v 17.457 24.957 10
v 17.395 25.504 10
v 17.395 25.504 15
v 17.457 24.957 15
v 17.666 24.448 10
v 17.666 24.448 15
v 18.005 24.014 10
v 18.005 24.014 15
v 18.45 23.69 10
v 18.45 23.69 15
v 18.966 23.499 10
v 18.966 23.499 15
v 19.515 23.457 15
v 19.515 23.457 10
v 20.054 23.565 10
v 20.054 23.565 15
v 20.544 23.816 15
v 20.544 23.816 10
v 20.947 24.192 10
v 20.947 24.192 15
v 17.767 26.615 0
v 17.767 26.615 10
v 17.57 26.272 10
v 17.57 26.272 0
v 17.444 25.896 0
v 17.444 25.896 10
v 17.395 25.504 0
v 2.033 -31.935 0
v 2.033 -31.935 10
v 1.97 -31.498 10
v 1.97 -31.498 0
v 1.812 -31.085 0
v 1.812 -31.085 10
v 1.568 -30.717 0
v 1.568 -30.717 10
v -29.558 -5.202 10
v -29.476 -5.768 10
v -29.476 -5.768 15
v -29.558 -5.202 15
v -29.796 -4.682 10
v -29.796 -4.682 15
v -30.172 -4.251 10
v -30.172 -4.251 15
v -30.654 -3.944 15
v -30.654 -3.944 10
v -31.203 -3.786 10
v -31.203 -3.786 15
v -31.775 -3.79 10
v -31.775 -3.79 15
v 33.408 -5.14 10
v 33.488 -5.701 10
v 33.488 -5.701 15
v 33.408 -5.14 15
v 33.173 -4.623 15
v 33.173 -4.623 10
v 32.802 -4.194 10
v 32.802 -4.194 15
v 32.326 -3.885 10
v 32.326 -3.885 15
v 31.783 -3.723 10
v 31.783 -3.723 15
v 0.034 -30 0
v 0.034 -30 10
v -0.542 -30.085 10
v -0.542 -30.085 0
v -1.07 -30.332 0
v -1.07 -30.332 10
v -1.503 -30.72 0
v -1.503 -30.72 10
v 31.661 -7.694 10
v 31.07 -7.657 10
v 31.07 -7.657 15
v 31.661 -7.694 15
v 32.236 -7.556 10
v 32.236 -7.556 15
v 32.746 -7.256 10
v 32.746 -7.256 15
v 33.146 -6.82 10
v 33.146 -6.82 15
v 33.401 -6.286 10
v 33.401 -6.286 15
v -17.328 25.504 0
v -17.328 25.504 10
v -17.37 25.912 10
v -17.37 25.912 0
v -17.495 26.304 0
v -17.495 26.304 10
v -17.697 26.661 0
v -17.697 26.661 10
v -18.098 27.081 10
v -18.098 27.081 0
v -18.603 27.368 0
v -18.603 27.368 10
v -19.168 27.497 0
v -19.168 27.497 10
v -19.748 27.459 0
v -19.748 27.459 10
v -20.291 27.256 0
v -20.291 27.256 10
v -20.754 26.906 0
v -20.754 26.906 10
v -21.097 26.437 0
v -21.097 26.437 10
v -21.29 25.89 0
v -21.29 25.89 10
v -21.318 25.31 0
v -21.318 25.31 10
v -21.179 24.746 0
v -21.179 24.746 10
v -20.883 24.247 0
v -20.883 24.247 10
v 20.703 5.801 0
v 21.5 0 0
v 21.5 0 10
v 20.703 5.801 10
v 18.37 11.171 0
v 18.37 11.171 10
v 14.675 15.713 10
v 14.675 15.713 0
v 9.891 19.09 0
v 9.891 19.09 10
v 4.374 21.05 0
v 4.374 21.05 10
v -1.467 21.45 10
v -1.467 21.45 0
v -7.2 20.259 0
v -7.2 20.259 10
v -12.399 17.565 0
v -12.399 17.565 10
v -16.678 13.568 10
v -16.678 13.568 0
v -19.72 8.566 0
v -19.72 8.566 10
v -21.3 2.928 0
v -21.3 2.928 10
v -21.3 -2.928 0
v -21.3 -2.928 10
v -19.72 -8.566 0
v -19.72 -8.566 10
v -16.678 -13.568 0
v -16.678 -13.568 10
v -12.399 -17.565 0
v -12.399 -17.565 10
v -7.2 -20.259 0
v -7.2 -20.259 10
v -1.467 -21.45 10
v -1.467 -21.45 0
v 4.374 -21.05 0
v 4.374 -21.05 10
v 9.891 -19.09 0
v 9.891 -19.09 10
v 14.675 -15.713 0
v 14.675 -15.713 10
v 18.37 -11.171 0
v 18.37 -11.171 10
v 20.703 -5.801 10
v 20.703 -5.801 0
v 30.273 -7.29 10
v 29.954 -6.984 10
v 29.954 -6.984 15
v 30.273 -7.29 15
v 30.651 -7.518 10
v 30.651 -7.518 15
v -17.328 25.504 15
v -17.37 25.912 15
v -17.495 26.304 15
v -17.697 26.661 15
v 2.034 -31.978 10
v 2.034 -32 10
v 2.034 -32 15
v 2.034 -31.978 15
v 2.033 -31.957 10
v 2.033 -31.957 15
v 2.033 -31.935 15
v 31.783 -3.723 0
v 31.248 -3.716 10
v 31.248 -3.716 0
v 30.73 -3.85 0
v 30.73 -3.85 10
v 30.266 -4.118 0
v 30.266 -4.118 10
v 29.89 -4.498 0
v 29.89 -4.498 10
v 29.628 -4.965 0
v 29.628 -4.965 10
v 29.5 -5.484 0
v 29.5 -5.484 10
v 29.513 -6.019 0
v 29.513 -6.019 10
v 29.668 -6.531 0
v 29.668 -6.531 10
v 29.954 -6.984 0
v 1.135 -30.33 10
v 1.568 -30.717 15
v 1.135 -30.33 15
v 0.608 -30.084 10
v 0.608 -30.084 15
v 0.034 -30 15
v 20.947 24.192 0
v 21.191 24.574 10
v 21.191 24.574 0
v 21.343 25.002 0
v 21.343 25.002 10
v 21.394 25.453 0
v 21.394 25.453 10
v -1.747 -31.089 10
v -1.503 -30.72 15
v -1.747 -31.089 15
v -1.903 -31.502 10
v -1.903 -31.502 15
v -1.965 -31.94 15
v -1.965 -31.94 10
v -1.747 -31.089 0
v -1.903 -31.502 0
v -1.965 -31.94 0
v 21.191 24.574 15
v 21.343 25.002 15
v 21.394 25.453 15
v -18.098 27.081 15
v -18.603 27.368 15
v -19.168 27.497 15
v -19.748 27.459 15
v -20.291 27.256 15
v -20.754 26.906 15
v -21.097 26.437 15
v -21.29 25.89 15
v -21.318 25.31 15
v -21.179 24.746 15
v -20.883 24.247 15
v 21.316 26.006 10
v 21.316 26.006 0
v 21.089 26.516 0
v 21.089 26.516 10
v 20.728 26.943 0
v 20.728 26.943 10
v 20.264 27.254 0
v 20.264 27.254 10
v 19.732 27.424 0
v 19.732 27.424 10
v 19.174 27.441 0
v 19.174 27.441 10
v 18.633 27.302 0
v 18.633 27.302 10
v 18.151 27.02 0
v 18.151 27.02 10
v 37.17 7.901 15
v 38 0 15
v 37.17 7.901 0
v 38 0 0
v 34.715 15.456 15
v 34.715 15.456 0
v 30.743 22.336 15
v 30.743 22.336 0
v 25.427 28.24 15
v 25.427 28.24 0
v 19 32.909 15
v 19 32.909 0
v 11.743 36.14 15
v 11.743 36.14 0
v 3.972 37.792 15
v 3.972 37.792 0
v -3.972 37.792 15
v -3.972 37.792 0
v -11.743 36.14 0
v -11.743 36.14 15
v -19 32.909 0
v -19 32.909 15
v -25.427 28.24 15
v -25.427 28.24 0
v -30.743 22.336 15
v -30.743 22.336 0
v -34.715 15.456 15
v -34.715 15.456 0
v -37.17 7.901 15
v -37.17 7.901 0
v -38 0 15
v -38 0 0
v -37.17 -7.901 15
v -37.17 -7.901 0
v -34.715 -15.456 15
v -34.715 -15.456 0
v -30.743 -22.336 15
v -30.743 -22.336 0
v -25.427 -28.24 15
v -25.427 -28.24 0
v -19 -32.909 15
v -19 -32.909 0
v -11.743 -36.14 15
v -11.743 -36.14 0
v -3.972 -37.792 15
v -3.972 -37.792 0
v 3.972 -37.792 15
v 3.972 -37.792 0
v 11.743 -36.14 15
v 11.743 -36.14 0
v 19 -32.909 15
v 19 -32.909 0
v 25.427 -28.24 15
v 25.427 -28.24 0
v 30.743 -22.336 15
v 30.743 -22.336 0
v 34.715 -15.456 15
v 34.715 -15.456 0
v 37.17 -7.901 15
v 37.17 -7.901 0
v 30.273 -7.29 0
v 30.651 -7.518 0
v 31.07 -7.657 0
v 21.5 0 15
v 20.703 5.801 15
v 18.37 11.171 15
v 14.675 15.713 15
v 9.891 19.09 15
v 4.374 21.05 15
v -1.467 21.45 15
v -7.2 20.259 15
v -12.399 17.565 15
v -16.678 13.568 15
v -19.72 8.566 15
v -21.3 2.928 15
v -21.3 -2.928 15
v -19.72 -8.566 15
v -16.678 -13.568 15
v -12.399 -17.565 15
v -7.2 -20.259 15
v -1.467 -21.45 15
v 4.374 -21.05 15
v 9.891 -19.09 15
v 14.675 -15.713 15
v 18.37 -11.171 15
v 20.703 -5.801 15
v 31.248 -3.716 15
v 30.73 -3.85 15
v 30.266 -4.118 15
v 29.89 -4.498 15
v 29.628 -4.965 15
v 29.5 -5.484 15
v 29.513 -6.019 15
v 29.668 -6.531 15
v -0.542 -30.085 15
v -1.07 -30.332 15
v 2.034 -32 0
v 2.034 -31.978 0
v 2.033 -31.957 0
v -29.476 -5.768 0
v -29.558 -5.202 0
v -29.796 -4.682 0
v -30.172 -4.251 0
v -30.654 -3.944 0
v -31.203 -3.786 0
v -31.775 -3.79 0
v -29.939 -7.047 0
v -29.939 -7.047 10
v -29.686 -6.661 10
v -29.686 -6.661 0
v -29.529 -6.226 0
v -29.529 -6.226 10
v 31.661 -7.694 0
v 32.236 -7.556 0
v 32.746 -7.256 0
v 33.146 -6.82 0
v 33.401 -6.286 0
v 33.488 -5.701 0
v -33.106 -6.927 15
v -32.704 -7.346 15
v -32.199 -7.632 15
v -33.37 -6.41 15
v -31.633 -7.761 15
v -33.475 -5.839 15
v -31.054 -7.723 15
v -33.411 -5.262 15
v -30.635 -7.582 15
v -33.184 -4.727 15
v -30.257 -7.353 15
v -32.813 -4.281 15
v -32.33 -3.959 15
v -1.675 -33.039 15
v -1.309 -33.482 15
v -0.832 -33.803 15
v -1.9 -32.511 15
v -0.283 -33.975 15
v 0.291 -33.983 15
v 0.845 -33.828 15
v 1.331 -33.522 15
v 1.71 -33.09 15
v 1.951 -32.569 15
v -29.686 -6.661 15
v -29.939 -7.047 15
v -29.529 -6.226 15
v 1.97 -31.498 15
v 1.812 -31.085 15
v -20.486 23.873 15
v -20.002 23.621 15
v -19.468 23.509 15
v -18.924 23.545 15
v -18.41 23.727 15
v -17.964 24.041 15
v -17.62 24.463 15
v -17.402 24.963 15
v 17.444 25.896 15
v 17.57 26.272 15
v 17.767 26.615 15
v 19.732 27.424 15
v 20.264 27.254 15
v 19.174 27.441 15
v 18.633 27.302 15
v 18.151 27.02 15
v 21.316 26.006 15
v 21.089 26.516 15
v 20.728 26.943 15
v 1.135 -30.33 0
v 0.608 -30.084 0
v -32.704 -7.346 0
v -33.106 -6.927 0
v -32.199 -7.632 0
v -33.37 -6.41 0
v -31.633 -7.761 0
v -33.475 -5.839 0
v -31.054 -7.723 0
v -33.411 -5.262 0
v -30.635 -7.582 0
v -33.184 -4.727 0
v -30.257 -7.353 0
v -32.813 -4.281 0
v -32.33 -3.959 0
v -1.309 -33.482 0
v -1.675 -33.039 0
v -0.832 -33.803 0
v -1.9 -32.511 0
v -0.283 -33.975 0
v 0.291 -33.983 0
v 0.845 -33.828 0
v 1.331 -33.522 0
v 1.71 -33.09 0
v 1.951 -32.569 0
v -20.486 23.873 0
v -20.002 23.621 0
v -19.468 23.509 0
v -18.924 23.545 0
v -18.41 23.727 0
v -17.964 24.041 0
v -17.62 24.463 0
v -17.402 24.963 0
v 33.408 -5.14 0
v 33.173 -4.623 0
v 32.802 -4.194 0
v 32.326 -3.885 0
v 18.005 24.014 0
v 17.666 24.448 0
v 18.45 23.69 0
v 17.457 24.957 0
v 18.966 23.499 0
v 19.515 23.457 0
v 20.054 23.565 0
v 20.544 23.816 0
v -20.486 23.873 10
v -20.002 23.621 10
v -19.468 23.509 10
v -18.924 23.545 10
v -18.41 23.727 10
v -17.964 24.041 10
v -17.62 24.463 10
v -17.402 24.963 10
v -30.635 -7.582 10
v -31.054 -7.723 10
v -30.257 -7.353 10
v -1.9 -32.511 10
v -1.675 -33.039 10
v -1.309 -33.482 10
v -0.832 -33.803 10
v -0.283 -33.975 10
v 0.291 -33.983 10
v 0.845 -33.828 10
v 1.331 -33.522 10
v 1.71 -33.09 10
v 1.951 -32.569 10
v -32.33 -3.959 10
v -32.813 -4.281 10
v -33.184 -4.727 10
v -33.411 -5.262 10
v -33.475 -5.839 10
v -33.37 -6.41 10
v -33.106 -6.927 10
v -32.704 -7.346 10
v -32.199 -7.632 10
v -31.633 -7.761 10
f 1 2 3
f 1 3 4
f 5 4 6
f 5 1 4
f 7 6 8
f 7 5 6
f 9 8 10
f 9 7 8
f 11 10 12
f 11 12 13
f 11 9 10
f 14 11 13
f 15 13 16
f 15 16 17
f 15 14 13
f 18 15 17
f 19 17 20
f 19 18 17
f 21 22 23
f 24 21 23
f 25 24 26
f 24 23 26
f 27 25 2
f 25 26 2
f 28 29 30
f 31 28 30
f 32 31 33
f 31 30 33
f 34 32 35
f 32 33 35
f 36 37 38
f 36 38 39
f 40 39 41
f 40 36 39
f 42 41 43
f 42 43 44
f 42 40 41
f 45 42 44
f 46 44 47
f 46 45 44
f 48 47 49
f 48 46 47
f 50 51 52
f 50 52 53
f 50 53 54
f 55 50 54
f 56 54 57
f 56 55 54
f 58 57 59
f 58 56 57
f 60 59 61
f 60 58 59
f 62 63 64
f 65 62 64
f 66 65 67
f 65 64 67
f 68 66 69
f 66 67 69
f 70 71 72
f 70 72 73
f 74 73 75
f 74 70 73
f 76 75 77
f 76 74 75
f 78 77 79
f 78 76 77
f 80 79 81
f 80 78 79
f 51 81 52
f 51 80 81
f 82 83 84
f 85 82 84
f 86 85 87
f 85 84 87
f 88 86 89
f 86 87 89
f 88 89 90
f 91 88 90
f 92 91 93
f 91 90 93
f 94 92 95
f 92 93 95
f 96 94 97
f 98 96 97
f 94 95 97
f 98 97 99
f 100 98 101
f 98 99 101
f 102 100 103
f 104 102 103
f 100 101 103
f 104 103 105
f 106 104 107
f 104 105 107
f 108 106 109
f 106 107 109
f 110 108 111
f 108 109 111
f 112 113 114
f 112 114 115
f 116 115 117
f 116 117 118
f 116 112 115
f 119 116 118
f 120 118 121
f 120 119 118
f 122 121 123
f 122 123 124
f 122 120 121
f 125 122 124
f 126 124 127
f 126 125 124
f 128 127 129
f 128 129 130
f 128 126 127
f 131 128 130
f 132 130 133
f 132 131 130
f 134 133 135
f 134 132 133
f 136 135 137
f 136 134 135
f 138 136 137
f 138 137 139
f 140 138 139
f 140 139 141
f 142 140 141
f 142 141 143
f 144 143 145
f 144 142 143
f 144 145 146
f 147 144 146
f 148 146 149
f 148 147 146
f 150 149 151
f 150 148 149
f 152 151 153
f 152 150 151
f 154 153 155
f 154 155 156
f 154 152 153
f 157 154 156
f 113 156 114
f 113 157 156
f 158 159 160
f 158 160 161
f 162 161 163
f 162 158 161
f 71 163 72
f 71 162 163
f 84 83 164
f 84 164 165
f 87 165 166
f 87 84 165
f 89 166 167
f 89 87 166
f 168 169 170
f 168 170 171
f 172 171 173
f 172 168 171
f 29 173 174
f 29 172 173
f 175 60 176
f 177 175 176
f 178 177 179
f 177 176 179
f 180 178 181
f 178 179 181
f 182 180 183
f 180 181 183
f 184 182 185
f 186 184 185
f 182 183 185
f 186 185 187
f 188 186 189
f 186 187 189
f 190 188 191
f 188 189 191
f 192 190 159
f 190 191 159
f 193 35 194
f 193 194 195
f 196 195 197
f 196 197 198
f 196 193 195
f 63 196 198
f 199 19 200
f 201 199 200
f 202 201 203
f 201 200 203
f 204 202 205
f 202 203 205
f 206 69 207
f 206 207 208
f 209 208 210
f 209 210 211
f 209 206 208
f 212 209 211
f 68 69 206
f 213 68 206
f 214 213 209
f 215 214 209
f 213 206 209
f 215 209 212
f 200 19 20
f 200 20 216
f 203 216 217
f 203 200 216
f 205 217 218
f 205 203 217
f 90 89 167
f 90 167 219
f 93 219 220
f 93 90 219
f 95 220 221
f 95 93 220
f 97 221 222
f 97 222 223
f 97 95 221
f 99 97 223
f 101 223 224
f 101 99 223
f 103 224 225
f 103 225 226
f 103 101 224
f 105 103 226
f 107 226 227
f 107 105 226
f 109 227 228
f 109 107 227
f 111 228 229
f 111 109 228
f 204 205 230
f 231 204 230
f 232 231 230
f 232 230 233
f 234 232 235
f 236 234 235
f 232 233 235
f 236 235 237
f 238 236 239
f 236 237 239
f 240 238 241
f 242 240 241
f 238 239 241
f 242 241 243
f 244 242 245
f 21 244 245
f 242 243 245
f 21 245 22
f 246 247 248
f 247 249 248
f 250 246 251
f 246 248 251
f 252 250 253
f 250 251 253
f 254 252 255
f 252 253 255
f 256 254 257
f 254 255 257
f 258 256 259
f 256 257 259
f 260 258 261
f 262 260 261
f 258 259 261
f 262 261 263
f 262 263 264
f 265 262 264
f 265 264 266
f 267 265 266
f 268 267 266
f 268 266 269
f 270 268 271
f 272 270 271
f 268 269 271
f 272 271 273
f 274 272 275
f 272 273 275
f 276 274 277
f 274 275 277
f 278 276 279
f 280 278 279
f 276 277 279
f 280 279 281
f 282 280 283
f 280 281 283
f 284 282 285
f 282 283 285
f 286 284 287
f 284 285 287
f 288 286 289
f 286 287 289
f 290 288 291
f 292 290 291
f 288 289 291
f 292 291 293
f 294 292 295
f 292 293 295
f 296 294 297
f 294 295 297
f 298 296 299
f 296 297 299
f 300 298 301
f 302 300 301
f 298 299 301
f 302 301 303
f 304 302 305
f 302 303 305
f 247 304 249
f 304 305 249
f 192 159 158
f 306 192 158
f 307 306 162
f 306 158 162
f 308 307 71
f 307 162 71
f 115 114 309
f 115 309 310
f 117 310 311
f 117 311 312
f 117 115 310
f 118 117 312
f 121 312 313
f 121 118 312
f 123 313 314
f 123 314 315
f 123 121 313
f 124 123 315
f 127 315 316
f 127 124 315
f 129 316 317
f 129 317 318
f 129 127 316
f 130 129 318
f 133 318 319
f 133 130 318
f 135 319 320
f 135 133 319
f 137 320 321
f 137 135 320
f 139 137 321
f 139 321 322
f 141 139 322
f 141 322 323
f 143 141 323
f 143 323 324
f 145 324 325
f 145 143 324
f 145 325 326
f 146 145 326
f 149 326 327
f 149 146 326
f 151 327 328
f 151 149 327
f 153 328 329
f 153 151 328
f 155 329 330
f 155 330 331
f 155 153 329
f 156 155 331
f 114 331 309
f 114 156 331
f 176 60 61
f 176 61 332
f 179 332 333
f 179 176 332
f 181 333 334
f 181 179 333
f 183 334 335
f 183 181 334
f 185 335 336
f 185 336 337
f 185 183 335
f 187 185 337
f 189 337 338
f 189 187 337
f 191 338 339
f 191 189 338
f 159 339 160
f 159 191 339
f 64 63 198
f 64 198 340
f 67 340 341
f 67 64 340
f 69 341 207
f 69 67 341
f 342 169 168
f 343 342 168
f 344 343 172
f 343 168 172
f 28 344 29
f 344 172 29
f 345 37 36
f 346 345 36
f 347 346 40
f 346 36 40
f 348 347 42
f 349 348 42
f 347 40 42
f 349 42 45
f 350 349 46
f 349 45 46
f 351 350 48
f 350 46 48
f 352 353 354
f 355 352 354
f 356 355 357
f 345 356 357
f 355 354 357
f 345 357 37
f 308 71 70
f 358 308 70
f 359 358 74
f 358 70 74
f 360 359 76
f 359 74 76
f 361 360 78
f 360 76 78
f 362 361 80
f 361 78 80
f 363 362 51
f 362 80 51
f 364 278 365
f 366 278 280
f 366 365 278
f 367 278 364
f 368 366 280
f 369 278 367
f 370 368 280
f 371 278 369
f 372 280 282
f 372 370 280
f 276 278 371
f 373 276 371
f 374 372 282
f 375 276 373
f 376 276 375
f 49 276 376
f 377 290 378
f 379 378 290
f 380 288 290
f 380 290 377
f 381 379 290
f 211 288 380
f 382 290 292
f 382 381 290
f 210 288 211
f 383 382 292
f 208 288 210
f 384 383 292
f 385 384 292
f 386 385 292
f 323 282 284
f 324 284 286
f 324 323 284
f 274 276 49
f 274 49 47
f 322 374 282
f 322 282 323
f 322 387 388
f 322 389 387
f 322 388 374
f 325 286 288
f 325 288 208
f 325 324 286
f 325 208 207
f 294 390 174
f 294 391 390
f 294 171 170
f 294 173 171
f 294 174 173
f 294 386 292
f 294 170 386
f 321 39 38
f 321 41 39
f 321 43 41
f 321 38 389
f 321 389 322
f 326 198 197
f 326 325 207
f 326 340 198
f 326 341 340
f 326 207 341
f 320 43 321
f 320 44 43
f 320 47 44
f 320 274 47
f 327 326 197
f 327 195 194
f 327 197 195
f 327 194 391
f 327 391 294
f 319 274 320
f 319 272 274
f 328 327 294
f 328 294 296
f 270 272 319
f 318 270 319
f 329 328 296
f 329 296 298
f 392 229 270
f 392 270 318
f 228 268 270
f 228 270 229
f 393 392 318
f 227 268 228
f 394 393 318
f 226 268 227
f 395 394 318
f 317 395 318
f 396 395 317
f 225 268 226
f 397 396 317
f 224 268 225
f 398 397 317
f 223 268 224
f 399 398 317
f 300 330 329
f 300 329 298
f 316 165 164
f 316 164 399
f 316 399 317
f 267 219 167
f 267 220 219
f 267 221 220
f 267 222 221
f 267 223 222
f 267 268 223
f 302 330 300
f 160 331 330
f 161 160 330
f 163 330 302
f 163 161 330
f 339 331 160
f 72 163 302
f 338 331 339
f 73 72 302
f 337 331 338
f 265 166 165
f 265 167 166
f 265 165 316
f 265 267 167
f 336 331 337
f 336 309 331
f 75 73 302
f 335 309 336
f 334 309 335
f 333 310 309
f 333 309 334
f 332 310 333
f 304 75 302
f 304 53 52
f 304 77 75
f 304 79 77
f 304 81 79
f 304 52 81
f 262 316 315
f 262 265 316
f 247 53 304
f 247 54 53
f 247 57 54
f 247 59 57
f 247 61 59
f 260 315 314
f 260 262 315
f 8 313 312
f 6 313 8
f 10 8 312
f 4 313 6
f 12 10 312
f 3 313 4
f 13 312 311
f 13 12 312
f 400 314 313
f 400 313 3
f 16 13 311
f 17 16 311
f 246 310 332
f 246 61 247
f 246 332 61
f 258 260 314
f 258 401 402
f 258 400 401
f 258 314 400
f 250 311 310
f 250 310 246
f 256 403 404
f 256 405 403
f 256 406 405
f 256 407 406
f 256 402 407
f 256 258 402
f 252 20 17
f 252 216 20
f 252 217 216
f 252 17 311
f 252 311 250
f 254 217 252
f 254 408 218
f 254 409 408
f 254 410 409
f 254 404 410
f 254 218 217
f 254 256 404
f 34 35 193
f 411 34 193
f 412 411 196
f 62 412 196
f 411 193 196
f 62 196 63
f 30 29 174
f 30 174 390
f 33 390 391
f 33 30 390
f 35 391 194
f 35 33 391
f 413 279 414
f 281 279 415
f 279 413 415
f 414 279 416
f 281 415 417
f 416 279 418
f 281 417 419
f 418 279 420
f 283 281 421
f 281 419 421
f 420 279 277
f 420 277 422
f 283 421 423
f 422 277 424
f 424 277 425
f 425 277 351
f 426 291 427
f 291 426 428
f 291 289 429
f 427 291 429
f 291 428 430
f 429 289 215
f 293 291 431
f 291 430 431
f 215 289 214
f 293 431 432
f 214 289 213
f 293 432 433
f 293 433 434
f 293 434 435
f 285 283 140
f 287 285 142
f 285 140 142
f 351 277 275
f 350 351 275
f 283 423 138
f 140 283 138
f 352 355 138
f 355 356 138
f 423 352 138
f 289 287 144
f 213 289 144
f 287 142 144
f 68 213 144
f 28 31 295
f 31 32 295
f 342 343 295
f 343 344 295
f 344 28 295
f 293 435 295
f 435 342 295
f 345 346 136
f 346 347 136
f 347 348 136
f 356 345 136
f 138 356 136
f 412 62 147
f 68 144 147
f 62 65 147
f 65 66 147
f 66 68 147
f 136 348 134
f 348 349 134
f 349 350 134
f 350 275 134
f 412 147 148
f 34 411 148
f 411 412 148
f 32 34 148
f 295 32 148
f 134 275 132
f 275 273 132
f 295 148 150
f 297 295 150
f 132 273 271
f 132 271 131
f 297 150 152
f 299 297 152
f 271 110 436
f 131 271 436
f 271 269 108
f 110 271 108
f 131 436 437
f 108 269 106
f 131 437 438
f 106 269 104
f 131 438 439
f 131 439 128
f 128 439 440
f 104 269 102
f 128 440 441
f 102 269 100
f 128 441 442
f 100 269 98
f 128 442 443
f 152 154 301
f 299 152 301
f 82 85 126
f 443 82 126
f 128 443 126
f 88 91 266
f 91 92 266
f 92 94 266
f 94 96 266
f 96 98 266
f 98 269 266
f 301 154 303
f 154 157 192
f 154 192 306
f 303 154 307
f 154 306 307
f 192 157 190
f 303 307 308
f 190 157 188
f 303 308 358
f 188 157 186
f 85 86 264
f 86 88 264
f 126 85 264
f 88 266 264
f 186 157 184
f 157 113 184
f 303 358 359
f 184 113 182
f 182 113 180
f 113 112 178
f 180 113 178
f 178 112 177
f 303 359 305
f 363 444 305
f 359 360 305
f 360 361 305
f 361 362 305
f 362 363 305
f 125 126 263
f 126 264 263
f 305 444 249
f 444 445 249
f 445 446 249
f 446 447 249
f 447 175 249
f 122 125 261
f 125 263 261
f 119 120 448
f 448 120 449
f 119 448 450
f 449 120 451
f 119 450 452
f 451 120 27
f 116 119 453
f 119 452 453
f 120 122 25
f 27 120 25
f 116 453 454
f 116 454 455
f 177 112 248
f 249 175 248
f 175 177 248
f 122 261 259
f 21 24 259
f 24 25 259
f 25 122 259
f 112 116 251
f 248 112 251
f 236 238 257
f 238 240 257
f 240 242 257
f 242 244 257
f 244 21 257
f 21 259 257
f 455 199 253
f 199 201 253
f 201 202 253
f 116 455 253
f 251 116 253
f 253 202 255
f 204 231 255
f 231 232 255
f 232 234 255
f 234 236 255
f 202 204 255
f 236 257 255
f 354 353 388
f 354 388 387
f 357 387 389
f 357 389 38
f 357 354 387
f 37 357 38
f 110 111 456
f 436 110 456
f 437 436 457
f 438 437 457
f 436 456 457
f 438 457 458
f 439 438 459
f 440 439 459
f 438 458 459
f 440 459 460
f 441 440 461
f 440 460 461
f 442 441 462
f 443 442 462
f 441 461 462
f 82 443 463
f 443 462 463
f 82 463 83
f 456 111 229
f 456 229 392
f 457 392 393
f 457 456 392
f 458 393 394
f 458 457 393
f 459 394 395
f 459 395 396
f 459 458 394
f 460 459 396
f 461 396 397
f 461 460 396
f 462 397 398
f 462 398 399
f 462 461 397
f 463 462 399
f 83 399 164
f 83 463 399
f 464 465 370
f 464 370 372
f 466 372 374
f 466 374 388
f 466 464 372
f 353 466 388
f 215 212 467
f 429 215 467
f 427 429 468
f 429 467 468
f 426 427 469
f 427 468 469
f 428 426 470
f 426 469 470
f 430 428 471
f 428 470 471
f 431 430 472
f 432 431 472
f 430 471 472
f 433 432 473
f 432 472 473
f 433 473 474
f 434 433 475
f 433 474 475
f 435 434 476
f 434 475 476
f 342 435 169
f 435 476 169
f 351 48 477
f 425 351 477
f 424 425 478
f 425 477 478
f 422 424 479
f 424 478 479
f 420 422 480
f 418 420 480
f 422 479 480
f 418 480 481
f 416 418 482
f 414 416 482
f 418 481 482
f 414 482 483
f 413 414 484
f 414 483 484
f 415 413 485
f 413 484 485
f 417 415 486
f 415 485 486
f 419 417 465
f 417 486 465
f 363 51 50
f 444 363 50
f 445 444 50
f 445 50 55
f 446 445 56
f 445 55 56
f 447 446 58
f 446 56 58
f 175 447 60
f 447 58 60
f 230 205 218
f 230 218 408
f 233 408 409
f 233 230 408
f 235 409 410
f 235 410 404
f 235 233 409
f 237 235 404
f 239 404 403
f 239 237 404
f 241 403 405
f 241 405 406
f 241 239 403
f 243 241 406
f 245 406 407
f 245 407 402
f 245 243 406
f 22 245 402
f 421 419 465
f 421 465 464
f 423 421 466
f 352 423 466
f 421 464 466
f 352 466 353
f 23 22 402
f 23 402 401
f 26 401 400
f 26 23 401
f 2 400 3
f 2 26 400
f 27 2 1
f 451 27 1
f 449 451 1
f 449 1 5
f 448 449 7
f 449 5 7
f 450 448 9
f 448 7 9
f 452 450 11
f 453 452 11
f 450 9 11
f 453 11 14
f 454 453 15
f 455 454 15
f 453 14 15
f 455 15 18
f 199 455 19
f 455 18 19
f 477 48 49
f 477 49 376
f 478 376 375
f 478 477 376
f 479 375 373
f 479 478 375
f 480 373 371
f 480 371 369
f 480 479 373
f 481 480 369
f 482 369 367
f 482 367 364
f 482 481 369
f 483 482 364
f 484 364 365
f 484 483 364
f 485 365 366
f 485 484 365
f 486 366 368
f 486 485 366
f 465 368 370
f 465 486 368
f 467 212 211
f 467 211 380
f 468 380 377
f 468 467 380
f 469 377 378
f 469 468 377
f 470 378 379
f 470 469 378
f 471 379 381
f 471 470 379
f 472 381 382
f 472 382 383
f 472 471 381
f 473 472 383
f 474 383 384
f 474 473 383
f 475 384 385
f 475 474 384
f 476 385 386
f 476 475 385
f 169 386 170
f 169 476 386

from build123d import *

# Parameters (mm, degrees)
F0_R     = 38
F0_R_2   = 21.5
F1_DEPTH = 10
F3_DEPTH = 10
F4_DEPTH = 5


with BuildPart() as f1:
    # F0 (on Top) → F1 (new body)
    with BuildSketch(Plane.XY):
        Circle(F0_R)
        Circle(F0_R_2, mode=Mode.SUBTRACT)
    extrude(amount=F1_DEPTH)

    # F2 (on face) → F3 (cut)
    with BuildSketch(Plane.XY.offset(10)):
        with BuildLine():
            ThreePointArc((17.3950694854, 25.5037771635), (18.7013512829, 23.576948176), (20.9465824354, 24.1917482683))
            ThreePointArc((20.9465824354, 24.1917482683), (19.3944253287, 25.4530207671), (17.7665087481, 26.6148674035))
            ThreePointArc((17.7665087481, 26.6148674035), (17.4976104485, 26.0871290467), (17.3950694854, 25.5037771635))
        make_face()
        with BuildLine():
            ThreePointArc((17.7665087481, 26.6148674035), (19.3944253287, 25.4530207671), (20.9465824354, 24.1917482683))
            ThreePointArc((20.9465824354, 24.1917482683), (21.2791420466, 24.7838101177), (21.3944253287, 25.4530207671))
            ThreePointArc((21.3944253287, 25.4530207671), (20.0044117379, 27.3577298212), (17.7665087481, 26.6148674035))
        make_face()
        with BuildLine():
            ThreePointArc((33.4880347509, -5.7011987796), (33.0028452429, -4.3953085953), (31.7826855775, -3.7230226271))
            ThreePointArc((31.7826855775, -3.7230226271), (31.6508184403, -4.7144132252), (31.4880347509, -5.7011987796))
            ThreePointArc((31.4880347509, -5.7011987796), (31.2944935166, -6.6824153971), (31.0703837886, -7.6571046244))
            ThreePointArc((31.0703837886, -7.6571046244), (32.7459493099, -7.2560785056), (33.4880347509, -5.7011987796))
        make_face()
        with BuildLine():
            ThreePointArc((31.4880347509, -5.7011987796), (31.6508184403, -4.7144132252), (31.7826855775, -3.7230226271))
            ThreePointArc((31.7826855775, -3.7230226271), (29.7436669076, -4.7228425934), (29.9536778777, -6.9840662652))
            Line((29.9536778777, -6.9840662652), (31.4880347509, -5.7011987796))
        make_face()
        with BuildLine():
            ThreePointArc((31.0703837886, -7.6571046244), (31.2944935166, -6.6824153971), (31.4880347509, -5.7011987796))
            Line((31.4880347509, -5.7011987796), (29.9536778777, -6.9840662652))
            ThreePointArc((29.9536778777, -6.9840662652), (30.4556448993, -7.414141042), (31.0703837886, -7.6571046244))
        make_face()
        with BuildLine():
            ThreePointArc((-17.3276317844, 25.5037771635), (-17.4221248046, 26.1112663816), (-17.6966749345, 26.6613521087))
            ThreePointArc((-17.6966749345, 26.6613521087), (-19.3276317844, 25.5037771635), (-20.8830900727, 24.2465780888))
            ThreePointArc((-20.8830900727, 24.2465780888), (-18.6608921713, 23.6181848724), (-17.3276317844, 25.5037771635))
        make_face()
        with BuildLine():
            ThreePointArc((-20.8830900727, 24.2465780888), (-19.3276317844, 25.5037771635), (-17.6966749345, 26.6613521087))
            ThreePointArc((-17.6966749345, 26.6613521087), (-20.5356087709, 27.0977632362), (-20.8830900727, 24.2465780888))
        make_face()
        with BuildLine():
            Line((0.0337188505, -31.999982235), (1.5680757237, -30.7171147494))
            ThreePointArc((1.5680757237, -30.7171147494), (0.8805556201, -30.1881137283), (0.0337188505, -29.999982235))
            Line((0.0337188505, -29.999982235), (0.0337188505, -31.999982235))
        make_face()
        with BuildLine():
            ThreePointArc((2.0326750825, -31.9353758708), (1.9024391118, -31.2873220179), (1.5680757237, -30.7171147494))
            Line((1.5680757237, -30.7171147494), (0.0337188505, -31.999982235))
            ThreePointArc((0.0337188505, -31.999982235), (1.033701827, -31.983299713), (2.0326750825, -31.9353758708))
        make_face()
        with BuildLine():
            ThreePointArc((2.0337188505, -31.999982235), (2.0334578915, -31.9676748374), (2.0326750825, -31.9353758708))
            ThreePointArc((2.0326750825, -31.9353758708), (1.033701827, -31.983299713), (0.0337188505, -31.999982235))
            ThreePointArc((0.0337188505, -31.999982235), (-0.9662970627, -31.9854071412), (-1.9653690958, -31.9395886686))
            ThreePointArc((-1.9653690958, -31.9395886686), (0.003518624, -33.9997542086), (2.0337188505, -31.999982235))
        make_face()
        with BuildLine():
            Line((0.0337188505, -31.999982235), (0.0337188505, -29.999982235))
            ThreePointArc((0.0337188505, -29.999982235), (-0.8150266404, -30.189007058), (-1.503338165, -30.7203511432))
            Line((-1.503338165, -30.7203511432), (0.0337188505, -31.999982235))
        make_face()
        with BuildLine():
            ThreePointArc((-1.9653690958, -31.9395886686), (-0.9662970627, -31.9854071412), (0.0337188505, -31.999982235))
            Line((0.0337188505, -31.999982235), (-1.503338165, -30.7203511432))
            ThreePointArc((-1.503338165, -30.7203511432), (-1.8364991405, -31.2912617919), (-1.9653690958, -31.9395886686))
        make_face()
        with BuildLine():
            ThreePointArc((-29.4759499676, -5.7675448535), (-30.1716566854, -4.2513591676), (-31.7747690017, -3.7899940488))
            ThreePointArc((-31.7747690017, -3.7899940488), (-31.640812874, -4.7811045451), (-31.4759499676, -5.7675448535))
            Line((-31.4759499676, -5.7675448535), (-29.9388929521, -7.0471759453))
            ThreePointArc((-29.9388929521, -7.0471759453), (-29.5952434473, -6.4479439896), (-29.4759499676, -5.7675448535))
        make_face()
        with BuildLine():
            ThreePointArc((-31.4759499676, -5.7675448535), (-31.640812874, -4.7811045451), (-31.7747690017, -3.7899940488))
            ThreePointArc((-31.7747690017, -3.7899940488), (-33.4431968406, -6.1280164068), (-31.054178004, -7.722566186))
            ThreePointArc((-31.054178004, -7.722566186), (-31.2803413207, -6.7483514181), (-31.4759499676, -5.7675448535))
        make_face()
        with BuildLine():
            Line((-29.9388929521, -7.0471759453), (-31.4759499676, -5.7675448535))
            ThreePointArc((-31.4759499676, -5.7675448535), (-31.2803413207, -6.7483514181), (-31.054178004, -7.722566186))
            ThreePointArc((-31.054178004, -7.722566186), (-30.4399525078, -7.4783076258), (-29.9388929521, -7.0471759453))
        make_face()
    extrude(amount=-F3_DEPTH, mode=Mode.SUBTRACT)

    # F4 (add): a face of the model
    f4_faces = [f1.faces().sort_by_distance(p)[0] for p in [
        (-36.9251976926, 0, 10),
    ]]
    extrude(f4_faces, amount=F4_DEPTH)


solid = f1.part
